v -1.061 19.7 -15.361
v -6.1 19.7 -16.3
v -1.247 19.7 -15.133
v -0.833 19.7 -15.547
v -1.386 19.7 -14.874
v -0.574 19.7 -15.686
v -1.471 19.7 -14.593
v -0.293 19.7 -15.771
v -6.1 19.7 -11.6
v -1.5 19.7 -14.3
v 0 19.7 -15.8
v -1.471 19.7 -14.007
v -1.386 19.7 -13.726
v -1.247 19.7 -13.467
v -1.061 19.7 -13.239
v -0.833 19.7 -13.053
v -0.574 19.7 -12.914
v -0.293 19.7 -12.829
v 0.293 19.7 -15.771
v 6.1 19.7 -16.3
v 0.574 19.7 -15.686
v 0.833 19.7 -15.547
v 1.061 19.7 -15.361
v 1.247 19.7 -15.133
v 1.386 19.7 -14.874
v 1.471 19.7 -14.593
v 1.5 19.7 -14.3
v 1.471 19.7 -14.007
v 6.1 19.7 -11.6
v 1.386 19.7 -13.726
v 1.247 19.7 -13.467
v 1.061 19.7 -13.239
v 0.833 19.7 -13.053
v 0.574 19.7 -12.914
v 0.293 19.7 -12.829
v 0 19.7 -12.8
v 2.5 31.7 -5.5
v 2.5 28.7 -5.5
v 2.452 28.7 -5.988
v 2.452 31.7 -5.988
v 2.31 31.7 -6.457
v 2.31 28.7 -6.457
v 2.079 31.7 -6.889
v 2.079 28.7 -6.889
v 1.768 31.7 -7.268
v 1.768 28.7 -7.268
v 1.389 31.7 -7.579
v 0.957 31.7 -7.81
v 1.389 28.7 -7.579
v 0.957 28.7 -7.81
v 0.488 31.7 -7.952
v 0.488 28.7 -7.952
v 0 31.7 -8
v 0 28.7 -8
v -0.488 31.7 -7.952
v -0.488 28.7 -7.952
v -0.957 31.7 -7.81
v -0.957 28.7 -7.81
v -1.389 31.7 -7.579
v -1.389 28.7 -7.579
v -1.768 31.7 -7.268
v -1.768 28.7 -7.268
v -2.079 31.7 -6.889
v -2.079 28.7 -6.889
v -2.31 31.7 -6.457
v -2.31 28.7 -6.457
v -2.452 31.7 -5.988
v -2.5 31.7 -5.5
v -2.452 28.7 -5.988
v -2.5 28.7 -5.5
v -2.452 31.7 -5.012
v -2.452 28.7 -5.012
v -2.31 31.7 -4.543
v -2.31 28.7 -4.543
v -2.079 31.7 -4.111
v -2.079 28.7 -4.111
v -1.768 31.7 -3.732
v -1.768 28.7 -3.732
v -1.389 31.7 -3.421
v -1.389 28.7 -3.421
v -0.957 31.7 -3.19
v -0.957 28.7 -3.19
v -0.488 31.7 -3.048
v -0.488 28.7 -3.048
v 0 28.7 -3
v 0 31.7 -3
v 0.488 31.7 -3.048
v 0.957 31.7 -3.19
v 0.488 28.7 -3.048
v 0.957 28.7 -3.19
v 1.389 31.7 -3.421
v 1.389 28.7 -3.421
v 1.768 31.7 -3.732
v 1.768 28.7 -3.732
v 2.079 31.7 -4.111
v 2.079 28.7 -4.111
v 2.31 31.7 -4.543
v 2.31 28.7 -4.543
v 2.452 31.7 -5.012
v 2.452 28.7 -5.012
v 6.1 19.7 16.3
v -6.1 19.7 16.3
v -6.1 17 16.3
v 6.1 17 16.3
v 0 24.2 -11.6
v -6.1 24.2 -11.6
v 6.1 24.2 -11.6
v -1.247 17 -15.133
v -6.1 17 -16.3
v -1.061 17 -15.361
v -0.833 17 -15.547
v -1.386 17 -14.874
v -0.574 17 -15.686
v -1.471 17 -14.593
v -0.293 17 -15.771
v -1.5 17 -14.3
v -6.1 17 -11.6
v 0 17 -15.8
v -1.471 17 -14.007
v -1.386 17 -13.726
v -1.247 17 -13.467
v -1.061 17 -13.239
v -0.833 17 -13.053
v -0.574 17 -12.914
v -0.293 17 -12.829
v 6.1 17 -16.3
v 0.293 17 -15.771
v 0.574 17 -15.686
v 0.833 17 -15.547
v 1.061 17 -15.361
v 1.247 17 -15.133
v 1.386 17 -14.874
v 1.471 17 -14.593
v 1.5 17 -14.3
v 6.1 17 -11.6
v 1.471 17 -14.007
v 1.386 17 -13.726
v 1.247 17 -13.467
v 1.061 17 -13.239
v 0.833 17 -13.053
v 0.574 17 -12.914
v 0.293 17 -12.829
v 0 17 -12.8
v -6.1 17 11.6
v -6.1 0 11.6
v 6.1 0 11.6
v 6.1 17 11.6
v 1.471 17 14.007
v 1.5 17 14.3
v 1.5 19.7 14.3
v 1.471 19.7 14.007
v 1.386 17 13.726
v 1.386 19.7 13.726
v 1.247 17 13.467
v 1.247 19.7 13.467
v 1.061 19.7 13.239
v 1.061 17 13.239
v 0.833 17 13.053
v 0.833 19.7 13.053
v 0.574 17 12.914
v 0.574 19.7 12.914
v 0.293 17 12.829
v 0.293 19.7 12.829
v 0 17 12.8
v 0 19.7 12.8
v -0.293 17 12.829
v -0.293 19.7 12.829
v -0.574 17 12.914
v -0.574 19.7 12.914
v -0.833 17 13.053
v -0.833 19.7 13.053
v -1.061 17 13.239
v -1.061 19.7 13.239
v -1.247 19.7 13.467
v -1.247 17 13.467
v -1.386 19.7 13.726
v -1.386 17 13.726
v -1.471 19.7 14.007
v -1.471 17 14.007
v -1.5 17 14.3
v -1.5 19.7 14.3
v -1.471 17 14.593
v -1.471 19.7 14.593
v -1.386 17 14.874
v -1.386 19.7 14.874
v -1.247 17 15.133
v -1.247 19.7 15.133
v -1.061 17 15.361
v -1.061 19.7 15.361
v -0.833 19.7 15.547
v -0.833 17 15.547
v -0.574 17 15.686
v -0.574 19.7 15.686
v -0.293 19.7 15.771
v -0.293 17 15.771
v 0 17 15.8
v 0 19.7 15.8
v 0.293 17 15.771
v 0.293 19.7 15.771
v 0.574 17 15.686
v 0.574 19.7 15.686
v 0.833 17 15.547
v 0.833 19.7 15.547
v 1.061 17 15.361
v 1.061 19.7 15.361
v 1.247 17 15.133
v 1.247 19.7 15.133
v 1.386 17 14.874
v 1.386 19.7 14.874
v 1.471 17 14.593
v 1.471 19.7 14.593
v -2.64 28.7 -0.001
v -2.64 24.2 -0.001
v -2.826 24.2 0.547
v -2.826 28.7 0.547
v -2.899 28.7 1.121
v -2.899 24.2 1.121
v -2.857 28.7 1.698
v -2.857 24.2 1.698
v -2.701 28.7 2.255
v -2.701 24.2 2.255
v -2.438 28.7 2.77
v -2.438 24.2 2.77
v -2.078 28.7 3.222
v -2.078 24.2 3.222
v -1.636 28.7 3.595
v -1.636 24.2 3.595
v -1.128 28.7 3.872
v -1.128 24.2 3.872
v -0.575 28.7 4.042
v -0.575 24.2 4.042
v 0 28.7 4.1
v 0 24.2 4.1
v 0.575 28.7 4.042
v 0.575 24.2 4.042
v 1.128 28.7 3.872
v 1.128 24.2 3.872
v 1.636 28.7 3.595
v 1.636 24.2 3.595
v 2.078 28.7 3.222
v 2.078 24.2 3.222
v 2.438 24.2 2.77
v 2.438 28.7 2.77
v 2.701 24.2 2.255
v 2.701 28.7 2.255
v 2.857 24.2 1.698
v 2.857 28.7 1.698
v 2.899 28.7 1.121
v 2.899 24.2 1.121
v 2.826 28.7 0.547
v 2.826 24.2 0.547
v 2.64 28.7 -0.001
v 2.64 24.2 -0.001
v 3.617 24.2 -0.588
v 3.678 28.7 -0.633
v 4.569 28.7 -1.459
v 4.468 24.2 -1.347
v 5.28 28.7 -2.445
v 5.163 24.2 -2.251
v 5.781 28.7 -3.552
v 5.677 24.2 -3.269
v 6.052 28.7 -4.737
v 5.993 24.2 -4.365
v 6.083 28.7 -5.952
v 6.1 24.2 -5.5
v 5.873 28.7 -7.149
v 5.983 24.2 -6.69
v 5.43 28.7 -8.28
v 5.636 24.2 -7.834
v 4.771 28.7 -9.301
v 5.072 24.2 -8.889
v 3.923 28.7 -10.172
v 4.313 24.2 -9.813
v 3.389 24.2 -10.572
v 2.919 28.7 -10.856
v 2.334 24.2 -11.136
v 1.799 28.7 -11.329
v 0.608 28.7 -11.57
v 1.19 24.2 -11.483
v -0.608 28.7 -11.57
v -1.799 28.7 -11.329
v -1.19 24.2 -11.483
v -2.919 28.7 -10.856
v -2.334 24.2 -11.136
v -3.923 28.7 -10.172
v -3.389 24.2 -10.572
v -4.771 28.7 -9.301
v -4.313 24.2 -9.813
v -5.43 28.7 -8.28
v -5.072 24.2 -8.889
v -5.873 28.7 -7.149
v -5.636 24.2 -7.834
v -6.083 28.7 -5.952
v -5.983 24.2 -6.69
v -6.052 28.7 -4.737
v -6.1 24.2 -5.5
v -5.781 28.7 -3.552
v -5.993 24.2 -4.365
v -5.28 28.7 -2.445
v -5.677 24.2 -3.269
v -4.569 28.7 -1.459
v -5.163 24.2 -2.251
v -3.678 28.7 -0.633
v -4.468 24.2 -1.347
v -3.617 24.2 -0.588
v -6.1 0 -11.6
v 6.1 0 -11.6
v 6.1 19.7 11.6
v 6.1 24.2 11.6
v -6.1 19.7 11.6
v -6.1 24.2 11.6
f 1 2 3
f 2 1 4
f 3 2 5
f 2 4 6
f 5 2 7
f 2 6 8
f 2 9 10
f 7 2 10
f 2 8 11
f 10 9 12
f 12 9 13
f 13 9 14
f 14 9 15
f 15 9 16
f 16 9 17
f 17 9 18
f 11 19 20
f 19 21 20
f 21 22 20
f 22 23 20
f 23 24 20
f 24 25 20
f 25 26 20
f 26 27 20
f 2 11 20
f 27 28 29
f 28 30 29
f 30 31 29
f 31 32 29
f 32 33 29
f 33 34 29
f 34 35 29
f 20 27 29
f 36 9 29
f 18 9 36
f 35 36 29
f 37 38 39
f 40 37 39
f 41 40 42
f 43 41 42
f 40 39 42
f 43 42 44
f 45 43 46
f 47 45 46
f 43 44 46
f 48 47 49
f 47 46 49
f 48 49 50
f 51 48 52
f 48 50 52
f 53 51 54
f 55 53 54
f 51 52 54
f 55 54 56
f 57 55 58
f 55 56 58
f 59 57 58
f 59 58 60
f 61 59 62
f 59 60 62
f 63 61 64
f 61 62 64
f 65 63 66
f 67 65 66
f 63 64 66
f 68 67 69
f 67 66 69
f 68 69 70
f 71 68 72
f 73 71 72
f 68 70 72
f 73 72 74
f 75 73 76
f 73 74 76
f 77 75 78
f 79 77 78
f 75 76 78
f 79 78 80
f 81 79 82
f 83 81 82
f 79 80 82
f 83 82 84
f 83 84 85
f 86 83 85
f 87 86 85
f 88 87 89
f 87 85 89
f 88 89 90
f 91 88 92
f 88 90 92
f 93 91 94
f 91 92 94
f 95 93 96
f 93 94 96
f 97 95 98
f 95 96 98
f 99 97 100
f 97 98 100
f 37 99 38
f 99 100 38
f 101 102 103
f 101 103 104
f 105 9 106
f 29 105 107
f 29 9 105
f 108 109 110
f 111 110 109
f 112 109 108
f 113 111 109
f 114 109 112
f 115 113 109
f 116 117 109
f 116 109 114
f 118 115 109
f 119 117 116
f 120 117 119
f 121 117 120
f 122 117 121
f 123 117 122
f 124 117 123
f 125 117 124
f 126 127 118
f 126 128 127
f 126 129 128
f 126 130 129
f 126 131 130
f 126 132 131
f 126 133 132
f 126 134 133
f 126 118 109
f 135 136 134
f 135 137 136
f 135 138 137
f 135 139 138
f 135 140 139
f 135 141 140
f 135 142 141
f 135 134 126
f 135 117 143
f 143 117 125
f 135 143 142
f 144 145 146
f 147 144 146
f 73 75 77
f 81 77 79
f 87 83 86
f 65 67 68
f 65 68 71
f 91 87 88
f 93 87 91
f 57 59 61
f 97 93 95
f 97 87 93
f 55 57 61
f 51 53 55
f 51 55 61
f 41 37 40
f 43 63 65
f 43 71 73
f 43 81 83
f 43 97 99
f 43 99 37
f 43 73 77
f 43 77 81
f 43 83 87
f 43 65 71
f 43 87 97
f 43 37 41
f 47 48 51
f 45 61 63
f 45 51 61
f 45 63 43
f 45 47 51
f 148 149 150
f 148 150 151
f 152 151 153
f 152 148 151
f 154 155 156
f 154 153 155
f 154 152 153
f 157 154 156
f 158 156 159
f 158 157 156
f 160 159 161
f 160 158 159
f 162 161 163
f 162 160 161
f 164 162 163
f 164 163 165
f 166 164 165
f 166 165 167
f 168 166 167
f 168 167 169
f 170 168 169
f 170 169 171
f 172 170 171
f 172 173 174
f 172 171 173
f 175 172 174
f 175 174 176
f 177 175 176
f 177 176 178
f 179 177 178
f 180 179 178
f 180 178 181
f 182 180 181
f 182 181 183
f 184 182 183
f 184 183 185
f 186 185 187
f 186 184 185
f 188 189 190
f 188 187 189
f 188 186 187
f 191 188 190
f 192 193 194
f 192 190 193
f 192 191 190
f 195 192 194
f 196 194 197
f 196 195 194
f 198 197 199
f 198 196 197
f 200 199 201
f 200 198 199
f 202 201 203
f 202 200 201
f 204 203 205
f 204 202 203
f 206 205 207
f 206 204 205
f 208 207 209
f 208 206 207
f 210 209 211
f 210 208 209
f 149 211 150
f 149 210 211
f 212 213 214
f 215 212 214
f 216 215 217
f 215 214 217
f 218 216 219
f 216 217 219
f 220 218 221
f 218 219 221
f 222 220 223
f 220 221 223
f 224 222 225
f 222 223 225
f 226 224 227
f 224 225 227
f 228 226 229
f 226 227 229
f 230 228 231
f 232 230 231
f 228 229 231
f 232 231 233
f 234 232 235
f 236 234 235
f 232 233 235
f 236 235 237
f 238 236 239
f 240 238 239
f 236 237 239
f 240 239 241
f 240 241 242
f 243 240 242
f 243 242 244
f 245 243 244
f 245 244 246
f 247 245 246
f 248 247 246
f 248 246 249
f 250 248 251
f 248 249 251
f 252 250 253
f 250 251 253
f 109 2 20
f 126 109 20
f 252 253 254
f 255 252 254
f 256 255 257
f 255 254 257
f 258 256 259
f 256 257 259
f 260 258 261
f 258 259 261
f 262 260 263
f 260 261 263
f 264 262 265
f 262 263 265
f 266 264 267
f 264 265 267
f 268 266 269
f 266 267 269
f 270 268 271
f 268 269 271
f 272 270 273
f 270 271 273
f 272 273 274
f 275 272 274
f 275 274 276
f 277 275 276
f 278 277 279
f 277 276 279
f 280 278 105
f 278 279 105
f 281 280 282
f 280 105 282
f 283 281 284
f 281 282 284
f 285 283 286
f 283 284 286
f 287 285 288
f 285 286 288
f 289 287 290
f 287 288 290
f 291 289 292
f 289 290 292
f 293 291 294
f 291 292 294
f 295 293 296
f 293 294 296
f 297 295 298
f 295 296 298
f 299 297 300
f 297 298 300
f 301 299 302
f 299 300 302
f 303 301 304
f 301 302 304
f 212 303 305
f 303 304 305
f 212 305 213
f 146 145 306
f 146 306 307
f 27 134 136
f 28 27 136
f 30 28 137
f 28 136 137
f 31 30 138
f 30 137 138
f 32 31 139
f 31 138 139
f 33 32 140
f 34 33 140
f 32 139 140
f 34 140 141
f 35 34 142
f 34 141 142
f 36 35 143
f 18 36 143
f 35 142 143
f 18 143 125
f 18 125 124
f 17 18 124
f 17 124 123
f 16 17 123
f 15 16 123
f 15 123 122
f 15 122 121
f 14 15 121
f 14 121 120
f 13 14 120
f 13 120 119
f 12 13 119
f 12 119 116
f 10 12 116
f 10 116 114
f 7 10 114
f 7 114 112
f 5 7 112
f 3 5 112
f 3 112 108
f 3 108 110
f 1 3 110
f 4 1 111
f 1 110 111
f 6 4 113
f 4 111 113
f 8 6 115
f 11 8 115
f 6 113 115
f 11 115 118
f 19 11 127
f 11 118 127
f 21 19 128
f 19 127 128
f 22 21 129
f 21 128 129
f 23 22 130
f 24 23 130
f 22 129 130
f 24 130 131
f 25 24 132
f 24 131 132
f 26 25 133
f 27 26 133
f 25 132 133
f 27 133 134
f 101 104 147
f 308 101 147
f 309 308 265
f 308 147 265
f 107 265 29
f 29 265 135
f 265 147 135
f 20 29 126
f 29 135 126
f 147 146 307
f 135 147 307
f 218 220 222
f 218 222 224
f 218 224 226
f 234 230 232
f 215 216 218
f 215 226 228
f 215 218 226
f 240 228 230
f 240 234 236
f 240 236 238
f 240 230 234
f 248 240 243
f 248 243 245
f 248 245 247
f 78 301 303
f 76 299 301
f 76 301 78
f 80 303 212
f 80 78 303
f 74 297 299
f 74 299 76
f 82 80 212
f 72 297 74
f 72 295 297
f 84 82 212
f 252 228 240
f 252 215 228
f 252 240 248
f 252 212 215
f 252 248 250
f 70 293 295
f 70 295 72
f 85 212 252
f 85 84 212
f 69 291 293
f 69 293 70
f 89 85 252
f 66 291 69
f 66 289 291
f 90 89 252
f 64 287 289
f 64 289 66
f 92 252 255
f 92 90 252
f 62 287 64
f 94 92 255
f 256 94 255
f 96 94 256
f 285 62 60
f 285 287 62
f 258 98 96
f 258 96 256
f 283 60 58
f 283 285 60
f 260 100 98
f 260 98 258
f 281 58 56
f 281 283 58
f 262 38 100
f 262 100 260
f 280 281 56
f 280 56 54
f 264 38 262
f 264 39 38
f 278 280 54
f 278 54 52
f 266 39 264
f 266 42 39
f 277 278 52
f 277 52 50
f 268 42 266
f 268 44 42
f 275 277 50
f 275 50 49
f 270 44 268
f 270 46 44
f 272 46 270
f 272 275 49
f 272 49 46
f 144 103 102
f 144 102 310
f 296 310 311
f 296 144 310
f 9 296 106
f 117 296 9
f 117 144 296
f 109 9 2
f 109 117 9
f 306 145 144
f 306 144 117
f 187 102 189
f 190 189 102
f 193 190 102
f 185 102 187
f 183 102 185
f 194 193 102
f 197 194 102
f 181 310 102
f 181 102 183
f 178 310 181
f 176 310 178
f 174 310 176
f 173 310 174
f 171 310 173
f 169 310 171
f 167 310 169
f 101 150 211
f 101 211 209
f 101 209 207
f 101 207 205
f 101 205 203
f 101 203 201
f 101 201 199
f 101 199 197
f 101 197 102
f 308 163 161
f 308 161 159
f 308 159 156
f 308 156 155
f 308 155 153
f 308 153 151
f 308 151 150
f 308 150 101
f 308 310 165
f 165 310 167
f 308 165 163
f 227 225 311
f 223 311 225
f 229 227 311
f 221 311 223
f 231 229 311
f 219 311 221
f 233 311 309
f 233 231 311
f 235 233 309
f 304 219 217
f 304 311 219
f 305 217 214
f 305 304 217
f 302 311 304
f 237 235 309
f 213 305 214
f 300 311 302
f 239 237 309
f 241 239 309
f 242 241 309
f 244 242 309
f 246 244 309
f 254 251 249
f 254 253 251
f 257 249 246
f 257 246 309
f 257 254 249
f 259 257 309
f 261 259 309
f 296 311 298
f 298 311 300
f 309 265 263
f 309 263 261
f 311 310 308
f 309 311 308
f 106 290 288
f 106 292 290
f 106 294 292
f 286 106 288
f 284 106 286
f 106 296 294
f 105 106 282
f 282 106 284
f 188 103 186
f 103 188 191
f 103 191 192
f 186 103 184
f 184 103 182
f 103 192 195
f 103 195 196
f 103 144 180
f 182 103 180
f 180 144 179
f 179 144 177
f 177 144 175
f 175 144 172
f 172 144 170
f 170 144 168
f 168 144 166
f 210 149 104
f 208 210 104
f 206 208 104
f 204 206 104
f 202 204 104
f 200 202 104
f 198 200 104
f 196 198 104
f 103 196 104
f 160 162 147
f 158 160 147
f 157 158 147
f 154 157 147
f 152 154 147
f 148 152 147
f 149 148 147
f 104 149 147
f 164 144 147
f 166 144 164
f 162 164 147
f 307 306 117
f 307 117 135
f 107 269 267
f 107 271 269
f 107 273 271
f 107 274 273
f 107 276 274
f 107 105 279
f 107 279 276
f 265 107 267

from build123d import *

# Parameters (mm, degrees)
SKETCH1_W           = 12.2
SKETCH1_H           = 23.2
BOSS_EXTRUDE3_DEPTH = 24.2
SKETCH5_W           = 12.2
SKETCH5_H           = 2.7
BOSS_EXTRUDE4_DEPTH = 4.7
CUT_EXTRUDE4_START  = -20.7
SKETCH6_R           = 1.5
CUT_EXTRUDE4_DEPTH  = 26.2
SKETCH7_R           = 2.9
SKETCH7_R_2         = 6.1
BOSS_EXTRUDE5_DEPTH = 4.5
SKETCH8_R           = 2.5
BOSS_EXTRUDE6_DEPTH = 3


with BuildPart() as part:
    # Sketch1 → Boss-Extrude3 (new body)
    with BuildSketch(Plane(origin=(0, 0, 0), x_dir=(1, 0, 0), z_dir=(0, 1, 0))):
        Rectangle(SKETCH1_W, SKETCH1_H)
    extrude(amount=BOSS_EXTRUDE3_DEPTH)

    # Sketch5 → Boss-Extrude4 (add)
    with BuildSketch(Plane.XY.offset(11.6)):
        with Locations((0, 18.35)):
            Rectangle(SKETCH5_W, SKETCH5_H)
    boss_extrude4 = extrude(amount=BOSS_EXTRUDE4_DEPTH)

    # Sketch6 → Cut-Extrude4 (cut)
    with BuildSketch(Plane(origin=(0, 19.7, 0), x_dir=(1, 0, 0), z_dir=(0, 1, 0)).offset(CUT_EXTRUDE4_START)):
        with Locations((0, -14.3)):
            Circle(SKETCH6_R)
    cut_extrude4 = extrude(amount=CUT_EXTRUDE4_DEPTH, mode=Mode.SUBTRACT)

    # Mirror3: Boss-Extrude4, Cut-Extrude4 across plane
    add(boss_extrude4.mirror(Plane.XY))
    add(cut_extrude4.mirror(Plane.XY), mode=Mode.SUBTRACT)

    # Sketch7 → Boss-Extrude5 (add)
    with BuildSketch(Plane(origin=(0, 24.2, 0), x_dir=(1, 0, 0), z_dir=(0, 1, 0))):
        with Locations((0, -1.2)):
            Circle(SKETCH7_R)
        with Locations((0, 5.5)):
            Circle(SKETCH7_R_2)
    extrude(amount=BOSS_EXTRUDE5_DEPTH)

    # Sketch8 → Boss-Extrude6 (add)
    with BuildSketch(Plane(origin=(0, 28.7, 0), x_dir=(1, 0, 0), z_dir=(0, 1, 0))):
        with Locations((0, 5.5)):
            Circle(SKETCH8_R)
    extrude(amount=BOSS_EXTRUDE6_DEPTH)


solid = part.part
